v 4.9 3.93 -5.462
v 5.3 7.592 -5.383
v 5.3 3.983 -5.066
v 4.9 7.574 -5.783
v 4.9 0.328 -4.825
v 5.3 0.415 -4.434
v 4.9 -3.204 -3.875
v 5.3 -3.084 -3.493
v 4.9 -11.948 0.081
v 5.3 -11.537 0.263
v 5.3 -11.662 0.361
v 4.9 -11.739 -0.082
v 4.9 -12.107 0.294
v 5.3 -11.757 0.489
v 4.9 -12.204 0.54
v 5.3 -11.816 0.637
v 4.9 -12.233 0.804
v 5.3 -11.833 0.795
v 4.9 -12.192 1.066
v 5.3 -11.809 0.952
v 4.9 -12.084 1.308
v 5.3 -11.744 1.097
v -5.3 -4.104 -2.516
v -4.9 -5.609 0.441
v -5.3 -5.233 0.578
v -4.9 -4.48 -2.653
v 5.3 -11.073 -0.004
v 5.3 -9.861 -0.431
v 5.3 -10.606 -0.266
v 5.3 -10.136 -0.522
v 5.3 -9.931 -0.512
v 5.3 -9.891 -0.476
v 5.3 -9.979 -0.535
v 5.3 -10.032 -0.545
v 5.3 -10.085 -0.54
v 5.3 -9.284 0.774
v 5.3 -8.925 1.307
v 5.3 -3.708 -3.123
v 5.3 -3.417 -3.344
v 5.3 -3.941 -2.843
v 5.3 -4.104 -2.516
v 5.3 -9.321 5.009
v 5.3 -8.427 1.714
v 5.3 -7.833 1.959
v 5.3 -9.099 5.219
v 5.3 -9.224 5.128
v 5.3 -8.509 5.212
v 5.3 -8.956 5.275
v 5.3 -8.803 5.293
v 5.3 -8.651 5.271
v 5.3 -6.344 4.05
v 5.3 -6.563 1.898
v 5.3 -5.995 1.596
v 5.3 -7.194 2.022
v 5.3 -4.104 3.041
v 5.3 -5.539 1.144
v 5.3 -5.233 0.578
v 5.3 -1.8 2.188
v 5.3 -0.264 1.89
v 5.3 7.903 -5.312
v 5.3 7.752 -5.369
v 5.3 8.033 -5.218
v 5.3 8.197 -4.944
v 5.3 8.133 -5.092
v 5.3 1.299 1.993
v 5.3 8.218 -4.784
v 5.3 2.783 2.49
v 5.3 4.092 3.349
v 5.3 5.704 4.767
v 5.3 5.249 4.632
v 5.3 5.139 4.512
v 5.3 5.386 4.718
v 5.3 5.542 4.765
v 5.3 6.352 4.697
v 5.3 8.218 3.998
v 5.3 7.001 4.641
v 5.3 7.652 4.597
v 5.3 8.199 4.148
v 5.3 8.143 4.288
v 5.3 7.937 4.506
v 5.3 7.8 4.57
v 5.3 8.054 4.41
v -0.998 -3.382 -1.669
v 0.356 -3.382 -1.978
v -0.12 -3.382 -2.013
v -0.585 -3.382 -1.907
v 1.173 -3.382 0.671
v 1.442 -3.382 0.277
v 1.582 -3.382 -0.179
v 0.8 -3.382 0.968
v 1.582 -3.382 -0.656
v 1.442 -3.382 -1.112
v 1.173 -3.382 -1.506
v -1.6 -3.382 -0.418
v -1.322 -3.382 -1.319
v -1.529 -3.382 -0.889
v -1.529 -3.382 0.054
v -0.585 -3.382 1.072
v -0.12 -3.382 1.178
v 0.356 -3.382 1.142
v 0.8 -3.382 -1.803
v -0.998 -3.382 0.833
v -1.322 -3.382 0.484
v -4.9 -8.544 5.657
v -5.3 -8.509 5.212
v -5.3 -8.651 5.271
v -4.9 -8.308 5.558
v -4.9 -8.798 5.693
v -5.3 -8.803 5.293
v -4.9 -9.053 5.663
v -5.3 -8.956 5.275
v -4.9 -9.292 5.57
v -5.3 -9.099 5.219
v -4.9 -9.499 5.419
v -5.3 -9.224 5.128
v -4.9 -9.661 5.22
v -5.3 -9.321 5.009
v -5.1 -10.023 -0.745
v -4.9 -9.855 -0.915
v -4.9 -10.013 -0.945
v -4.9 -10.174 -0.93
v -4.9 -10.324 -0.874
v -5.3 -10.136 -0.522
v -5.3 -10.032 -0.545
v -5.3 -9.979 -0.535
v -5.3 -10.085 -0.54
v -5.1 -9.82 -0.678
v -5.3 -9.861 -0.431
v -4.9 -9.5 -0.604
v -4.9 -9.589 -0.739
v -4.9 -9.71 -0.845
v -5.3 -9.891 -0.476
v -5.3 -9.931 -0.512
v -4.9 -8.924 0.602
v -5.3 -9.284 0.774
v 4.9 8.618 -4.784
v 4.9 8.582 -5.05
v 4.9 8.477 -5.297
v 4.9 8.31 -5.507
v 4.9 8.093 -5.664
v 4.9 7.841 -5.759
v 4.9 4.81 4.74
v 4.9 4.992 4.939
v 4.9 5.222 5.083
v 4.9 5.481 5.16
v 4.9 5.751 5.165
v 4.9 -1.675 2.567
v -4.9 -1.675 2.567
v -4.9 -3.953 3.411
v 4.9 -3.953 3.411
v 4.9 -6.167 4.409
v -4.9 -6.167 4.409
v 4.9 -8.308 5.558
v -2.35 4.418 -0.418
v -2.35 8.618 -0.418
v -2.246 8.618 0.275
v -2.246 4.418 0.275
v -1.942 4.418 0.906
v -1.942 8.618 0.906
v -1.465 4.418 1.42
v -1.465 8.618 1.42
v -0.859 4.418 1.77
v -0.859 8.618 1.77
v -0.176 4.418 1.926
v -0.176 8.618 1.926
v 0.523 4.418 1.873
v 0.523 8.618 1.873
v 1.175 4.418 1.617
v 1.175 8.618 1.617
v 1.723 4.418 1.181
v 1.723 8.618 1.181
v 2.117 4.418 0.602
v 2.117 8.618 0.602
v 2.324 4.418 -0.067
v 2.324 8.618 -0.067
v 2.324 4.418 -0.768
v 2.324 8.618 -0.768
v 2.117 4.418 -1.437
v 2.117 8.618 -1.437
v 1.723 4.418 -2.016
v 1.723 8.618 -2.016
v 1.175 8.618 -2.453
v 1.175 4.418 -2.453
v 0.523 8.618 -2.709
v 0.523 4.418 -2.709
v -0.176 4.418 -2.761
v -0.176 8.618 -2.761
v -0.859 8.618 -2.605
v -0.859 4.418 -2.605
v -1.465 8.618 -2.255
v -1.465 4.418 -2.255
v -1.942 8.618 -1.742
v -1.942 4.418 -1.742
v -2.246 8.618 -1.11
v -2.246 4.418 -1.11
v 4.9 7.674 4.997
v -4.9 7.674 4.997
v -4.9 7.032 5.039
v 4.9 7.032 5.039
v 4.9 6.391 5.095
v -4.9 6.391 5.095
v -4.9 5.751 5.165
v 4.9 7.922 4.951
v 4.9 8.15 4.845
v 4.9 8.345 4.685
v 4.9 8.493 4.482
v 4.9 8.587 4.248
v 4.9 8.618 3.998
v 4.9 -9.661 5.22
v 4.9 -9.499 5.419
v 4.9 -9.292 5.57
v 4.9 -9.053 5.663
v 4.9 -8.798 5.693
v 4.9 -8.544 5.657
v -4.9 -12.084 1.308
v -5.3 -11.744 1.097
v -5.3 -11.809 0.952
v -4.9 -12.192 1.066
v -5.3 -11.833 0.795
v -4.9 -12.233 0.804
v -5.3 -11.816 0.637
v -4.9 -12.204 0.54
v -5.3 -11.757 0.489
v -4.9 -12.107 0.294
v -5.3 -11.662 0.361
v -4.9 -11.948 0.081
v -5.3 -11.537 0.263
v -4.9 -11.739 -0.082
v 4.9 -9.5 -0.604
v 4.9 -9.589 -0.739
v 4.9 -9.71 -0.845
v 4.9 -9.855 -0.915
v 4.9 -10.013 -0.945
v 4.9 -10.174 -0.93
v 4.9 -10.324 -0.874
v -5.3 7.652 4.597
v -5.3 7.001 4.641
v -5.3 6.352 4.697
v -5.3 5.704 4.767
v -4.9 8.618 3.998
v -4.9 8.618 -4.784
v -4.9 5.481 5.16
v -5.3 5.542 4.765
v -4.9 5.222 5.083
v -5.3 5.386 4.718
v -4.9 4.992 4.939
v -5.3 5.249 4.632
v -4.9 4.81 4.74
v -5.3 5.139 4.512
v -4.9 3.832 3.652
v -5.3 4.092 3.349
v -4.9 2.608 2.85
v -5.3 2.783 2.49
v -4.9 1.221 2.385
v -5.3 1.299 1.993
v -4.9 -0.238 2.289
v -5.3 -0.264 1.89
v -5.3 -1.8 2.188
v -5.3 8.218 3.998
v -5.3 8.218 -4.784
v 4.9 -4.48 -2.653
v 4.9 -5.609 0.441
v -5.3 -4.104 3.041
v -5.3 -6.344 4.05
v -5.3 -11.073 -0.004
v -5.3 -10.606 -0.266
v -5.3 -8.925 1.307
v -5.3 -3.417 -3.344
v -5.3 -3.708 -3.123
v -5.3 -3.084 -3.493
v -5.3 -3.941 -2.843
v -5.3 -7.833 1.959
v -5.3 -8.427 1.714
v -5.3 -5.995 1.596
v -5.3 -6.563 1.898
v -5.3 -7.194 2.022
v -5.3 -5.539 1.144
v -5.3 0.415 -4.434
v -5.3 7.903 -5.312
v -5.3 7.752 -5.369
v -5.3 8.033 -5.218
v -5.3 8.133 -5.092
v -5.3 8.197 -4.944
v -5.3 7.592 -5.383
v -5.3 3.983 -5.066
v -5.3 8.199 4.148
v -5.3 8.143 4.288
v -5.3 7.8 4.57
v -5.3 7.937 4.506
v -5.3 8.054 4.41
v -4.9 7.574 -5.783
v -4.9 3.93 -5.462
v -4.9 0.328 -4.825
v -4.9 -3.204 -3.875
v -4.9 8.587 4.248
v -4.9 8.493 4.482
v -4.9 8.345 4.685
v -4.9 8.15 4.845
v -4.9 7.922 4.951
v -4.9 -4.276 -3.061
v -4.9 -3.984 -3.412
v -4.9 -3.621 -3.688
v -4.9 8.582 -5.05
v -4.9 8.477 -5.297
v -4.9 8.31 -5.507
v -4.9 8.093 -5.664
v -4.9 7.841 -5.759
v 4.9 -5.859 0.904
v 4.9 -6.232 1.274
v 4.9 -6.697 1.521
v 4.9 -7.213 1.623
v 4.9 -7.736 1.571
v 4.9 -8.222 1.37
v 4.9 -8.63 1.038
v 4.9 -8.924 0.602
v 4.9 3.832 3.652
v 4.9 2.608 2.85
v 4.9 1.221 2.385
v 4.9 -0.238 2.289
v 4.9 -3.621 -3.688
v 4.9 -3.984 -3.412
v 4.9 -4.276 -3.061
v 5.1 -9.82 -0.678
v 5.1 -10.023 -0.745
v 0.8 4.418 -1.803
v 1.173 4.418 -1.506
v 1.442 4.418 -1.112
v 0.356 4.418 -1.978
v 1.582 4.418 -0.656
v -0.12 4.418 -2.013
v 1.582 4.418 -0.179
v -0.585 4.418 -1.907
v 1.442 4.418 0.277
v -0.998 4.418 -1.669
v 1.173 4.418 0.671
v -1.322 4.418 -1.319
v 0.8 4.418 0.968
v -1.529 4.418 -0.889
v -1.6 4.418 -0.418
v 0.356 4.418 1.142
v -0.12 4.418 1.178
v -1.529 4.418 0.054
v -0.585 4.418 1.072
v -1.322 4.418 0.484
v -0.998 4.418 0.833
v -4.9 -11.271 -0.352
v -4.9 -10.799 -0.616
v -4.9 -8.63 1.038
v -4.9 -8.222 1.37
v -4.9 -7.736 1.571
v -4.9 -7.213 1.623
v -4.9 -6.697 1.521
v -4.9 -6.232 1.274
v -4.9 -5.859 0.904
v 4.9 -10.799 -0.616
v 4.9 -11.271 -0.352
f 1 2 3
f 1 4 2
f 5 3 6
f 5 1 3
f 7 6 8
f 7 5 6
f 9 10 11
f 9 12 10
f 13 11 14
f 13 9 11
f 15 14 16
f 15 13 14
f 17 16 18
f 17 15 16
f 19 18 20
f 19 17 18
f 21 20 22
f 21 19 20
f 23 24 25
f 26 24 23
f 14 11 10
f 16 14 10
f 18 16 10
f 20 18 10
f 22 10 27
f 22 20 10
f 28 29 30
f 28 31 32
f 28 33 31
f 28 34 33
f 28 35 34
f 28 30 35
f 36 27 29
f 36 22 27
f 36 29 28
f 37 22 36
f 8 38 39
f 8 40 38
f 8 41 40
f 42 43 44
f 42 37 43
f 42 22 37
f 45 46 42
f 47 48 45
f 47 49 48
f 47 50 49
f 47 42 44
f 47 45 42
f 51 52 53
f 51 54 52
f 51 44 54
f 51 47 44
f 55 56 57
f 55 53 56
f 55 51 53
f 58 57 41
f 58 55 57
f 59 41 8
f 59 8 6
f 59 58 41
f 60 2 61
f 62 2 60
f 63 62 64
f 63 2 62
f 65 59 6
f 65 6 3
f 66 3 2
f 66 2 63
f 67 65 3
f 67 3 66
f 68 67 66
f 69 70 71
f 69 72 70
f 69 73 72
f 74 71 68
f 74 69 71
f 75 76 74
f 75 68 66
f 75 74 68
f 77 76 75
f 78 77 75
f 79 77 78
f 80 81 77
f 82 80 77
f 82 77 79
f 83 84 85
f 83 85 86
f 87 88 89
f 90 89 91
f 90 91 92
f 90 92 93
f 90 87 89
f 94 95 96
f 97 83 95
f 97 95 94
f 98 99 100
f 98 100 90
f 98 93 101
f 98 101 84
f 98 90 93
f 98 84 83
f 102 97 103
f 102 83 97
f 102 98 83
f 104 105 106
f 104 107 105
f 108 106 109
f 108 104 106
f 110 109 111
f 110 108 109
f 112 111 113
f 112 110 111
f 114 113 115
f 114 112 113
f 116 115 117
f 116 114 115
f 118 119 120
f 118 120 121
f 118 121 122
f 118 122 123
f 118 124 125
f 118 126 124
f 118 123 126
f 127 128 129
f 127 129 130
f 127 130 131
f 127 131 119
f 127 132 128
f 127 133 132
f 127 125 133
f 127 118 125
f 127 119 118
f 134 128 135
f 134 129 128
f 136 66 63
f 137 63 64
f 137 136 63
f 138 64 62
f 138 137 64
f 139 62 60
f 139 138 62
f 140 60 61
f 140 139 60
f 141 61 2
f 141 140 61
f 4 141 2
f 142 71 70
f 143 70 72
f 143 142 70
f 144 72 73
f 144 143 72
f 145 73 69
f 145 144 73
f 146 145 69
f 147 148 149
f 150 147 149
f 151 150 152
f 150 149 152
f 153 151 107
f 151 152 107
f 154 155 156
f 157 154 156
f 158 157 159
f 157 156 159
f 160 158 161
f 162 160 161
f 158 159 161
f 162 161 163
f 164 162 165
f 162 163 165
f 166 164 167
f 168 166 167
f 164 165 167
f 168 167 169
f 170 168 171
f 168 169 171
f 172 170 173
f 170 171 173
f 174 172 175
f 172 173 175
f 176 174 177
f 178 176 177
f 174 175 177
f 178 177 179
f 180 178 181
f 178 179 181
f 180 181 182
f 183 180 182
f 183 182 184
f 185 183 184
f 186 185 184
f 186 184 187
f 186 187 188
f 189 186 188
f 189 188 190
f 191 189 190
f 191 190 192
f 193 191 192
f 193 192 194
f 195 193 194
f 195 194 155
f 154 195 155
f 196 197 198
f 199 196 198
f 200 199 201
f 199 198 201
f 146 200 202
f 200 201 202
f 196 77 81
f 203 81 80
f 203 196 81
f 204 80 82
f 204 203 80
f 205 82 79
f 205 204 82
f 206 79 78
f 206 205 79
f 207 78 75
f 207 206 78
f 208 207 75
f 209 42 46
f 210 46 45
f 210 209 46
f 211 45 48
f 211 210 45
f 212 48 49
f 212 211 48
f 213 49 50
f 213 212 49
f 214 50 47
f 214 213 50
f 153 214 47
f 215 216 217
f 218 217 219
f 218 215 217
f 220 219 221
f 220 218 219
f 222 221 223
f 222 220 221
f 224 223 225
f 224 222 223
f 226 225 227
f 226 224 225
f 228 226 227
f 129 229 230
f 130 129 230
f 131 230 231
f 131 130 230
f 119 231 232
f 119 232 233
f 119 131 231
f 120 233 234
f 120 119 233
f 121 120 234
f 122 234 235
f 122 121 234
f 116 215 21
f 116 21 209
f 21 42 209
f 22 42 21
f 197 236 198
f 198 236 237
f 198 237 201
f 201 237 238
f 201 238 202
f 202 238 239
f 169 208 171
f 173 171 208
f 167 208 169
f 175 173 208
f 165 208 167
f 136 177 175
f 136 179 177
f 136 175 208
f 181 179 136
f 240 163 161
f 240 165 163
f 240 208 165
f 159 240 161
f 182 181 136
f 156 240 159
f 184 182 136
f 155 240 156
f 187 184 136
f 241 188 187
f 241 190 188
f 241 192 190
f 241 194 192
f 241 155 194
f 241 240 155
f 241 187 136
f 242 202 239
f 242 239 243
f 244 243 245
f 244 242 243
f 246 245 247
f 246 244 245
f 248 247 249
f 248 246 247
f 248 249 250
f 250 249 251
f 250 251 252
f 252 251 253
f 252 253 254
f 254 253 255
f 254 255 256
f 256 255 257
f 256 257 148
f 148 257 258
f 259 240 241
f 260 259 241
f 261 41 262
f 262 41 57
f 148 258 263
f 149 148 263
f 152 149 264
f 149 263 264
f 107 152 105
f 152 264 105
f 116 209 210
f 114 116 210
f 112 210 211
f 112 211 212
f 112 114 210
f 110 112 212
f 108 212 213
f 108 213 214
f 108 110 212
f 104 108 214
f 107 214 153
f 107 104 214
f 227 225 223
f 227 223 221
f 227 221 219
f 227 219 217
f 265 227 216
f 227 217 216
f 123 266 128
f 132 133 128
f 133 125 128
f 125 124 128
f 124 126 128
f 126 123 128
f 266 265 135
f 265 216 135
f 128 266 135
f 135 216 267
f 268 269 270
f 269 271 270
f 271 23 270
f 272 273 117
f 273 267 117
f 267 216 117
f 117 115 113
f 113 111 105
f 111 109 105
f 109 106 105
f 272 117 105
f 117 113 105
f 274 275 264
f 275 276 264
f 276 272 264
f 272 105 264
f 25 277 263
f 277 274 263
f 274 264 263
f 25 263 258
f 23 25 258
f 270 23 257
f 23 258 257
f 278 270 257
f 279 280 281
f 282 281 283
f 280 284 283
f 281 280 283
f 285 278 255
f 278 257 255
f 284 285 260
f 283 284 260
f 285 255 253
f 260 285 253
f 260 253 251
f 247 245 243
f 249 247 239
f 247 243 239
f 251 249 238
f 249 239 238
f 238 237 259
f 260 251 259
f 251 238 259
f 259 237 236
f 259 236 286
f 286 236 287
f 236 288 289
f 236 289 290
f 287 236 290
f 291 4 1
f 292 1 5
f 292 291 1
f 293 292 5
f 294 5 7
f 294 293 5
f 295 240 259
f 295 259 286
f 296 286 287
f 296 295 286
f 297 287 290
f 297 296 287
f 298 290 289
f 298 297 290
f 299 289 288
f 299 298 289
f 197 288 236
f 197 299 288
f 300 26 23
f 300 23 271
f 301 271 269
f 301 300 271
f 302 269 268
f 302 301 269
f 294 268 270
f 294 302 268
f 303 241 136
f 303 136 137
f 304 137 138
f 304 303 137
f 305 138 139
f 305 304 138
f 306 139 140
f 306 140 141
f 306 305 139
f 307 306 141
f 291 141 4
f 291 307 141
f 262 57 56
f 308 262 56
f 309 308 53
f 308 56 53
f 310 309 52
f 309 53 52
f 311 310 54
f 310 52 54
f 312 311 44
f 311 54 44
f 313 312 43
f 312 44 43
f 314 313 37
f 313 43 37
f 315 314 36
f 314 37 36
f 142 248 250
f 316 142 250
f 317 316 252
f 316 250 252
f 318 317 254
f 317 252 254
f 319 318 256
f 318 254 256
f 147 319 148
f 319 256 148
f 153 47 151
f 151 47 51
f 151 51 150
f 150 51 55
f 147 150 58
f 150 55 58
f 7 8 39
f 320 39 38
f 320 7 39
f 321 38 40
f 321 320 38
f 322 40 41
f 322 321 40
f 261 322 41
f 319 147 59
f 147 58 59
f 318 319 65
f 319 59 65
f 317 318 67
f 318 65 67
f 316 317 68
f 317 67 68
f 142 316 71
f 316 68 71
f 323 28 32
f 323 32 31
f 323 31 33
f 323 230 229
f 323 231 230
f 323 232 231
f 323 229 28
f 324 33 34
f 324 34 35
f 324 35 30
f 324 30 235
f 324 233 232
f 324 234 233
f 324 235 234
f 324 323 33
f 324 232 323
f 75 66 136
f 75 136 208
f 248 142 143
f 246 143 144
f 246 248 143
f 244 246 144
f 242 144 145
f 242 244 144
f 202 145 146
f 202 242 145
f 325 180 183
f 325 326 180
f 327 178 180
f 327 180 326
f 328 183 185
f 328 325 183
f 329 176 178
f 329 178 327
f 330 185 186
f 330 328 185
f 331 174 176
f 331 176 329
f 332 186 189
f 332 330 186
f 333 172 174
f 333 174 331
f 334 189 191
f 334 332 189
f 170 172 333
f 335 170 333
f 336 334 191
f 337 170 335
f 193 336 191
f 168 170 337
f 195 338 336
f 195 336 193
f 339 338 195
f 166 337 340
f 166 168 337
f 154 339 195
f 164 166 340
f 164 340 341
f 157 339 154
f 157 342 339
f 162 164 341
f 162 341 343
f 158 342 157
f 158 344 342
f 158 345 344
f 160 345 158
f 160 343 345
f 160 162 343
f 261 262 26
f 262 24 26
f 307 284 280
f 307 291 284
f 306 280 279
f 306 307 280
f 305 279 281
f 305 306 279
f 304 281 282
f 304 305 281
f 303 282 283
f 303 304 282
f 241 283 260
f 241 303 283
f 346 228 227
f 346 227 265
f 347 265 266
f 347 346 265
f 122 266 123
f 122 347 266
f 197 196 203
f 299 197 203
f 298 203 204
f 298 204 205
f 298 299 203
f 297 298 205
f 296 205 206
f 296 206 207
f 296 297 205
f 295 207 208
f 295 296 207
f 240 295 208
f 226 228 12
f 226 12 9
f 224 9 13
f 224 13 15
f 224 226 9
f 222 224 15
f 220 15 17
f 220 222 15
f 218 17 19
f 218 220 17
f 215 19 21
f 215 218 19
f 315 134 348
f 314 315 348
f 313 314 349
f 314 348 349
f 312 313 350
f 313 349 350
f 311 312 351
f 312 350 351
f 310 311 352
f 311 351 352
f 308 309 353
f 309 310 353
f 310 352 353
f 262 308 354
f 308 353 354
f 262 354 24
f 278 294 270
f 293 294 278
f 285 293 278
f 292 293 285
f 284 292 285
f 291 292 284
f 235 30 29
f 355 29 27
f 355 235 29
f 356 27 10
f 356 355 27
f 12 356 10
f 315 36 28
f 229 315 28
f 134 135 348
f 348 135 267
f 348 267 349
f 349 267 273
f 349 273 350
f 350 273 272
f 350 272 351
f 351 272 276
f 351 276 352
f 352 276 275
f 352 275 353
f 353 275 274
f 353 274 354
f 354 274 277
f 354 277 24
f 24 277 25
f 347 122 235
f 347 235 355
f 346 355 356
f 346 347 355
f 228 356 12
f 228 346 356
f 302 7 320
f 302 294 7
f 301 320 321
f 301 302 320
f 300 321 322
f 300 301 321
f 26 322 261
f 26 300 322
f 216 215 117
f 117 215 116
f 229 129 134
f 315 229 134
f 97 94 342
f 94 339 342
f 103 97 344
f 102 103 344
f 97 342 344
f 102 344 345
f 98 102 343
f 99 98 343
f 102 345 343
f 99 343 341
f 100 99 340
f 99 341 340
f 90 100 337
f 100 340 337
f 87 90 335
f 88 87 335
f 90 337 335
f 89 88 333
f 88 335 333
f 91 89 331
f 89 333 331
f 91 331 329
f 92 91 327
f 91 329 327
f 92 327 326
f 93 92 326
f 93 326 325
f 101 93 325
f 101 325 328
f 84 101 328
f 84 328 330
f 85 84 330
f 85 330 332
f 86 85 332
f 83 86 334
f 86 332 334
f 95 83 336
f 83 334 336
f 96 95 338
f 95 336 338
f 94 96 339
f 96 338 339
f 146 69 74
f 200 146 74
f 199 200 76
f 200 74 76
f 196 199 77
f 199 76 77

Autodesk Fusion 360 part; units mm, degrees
sketch "Sketch1" plane through (0, 0, 0) normal (1, 0, 0) x (0, 1, 0) in component "latch_shuttle"
  arc A0 (-8.3077, 5.5575) -> (-1.6746, 2.5672) centre (9.4182, 36.0259) ccw
  arc A1 (-8.3077, 5.5575) -> (-9.6608, 5.2196) centre (-8.8106, 4.6931) ccw
  line L0 (-12.0836, 1.3076) -> (-9.6608, 5.2196)
  arc A2 (-12.0836, 1.3076) -> (-11.739, -0.0818) centre (-11.2334, 0.781) ccw
  arc A3 (-11.739, -0.0818) -> (-10.3245, -0.8742) centre (9.4182, 36.0259) ccw
  arc A4 (-10.3245, -0.8742) -> (-9.5002, -0.6041) centre (-10.0414, -0.3452) ccw
  line L1 (-9.5002, -0.6041) -> (-8.9235, 0.6015)
  arc A5 (-5.6086, 0.4414) -> (-8.9235, 0.6015) centre (-7.2997, -0.1753) ccw
  line L2 (-5.6086, 0.4414) -> (-4.4802, -2.6531)
  arc A6 (-4.4802, -2.6531) -> (-3.2044, -3.8747) centre (-2.6012, -1.9679) ccw
  arc A7 (-3.2044, -3.8747) -> (7.5742, -5.7831) centre (9.4182, 36.0259) ccw
  arc A8 (7.5742, -5.7831) -> (8.6182, -4.784) centre (7.6182, -4.784) ccw
  line L3 (8.6182, 3.9982) -> (8.6182, -4.784)
  arc A9 (8.6182, 3.9982) -> (7.6743, 4.9966) centre (7.6182, 3.9982) ccw
  arc A10 (5.7512, 5.1647) -> (7.6743, 4.9966) centre (9.4182, 36.0259) ccw
  arc A11 (5.7512, 5.1647) -> (4.8102, 4.7397) centre (5.6332, 4.1717) ccw
  arc A12 (-1.6746, 2.5672) -> (4.8102, 4.7397) centre (0.1191, 7.9776) ccw
extrude "Extrude1" add sketch "Sketch1" along normal mid plane 10.6 in component "latch_shuttle"
chamfer "Chamfer1" distance 0.4 angle 45 34 edges at (5.3, -5.0685, 3.8907) (5.3, -9.0529, 5.6633) (5.3, -10.8722, 3.2636) (5.3, -12.204, 0.5403) (5.3, -11.0356, -0.4848) (5.3, -9.8546, -0.9153) (5.3, -9.2118, -0.0013) (5.3, -7.2129, 1.6226) (5.3, -5.0444, -1.1058) (5.3, -3.9845, -3.4124) (5.3, 2.1222, -5.1828) (5.3, 8.3096, -5.5066) (5.3, 8.6182, -0.3929) (5.3, 8.3449, 4.6851) (5.3, 6.7115, 5.0657) (5.3, 5.2216, 5.0831) (5.3, 1.9298, 2.5728) (-5.3, 8.6182, -0.3929) (-5.3, 8.3096, -5.5066) (-5.3, 2.1222, -5.1828) (-5.3, -3.9845, -3.4124) (-5.3, -5.0444, -1.1058) (-5.3, -7.2129, 1.6226) (-5.3, -9.2118, -0.0013) (-5.3, -9.8546, -0.9153) (-5.3, -11.0356, -0.4848) (-5.3, -12.204, 0.5403) (-5.3, -10.8722, 3.2636) (-5.3, -9.0529, 5.6633) (-5.3, -5.0685, 3.8907) (-5.3, 1.9298, 2.5728) (-5.3, 5.2216, 5.0831) (-5.3, 6.7115, 5.0657) (-5.3, 8.3449, 4.6851) in component "latch_shuttle"
sketch "Sketch2" plane through (0, 8.6182, 0) normal (0, 1, 0) x (-1, 0, 0) in component "latch_shuttle"
  line L0 (4.9, -4.784) -> (4.9, 3.9982)
  line L1 (4.9, 3.9982) -> (-4.9, 3.9982)
  line L2 (-4.9, 3.9982) -> (-4.9, -4.784)
  line L3 (-4.9, -4.784) -> (4.9, -4.784)
  circle A0 centre (0, -0.4177) radius 1.6
  circle A1 centre (0, -0.4177) radius 2.35
extrude "Extrude2" cut sketch "Sketch2" against normal blind 4.2 contours A0 | A1 in component "latch_shuttle"
extrude "Extrude3" cut sketch "Sketch2" against normal blind 12 contours A0 in component "latch_shuttle"
component "latch_shuttle" placed x (1, 0, 0) y (0, 1, 0) z (0, 0, 1) at (0, 0, 0)
